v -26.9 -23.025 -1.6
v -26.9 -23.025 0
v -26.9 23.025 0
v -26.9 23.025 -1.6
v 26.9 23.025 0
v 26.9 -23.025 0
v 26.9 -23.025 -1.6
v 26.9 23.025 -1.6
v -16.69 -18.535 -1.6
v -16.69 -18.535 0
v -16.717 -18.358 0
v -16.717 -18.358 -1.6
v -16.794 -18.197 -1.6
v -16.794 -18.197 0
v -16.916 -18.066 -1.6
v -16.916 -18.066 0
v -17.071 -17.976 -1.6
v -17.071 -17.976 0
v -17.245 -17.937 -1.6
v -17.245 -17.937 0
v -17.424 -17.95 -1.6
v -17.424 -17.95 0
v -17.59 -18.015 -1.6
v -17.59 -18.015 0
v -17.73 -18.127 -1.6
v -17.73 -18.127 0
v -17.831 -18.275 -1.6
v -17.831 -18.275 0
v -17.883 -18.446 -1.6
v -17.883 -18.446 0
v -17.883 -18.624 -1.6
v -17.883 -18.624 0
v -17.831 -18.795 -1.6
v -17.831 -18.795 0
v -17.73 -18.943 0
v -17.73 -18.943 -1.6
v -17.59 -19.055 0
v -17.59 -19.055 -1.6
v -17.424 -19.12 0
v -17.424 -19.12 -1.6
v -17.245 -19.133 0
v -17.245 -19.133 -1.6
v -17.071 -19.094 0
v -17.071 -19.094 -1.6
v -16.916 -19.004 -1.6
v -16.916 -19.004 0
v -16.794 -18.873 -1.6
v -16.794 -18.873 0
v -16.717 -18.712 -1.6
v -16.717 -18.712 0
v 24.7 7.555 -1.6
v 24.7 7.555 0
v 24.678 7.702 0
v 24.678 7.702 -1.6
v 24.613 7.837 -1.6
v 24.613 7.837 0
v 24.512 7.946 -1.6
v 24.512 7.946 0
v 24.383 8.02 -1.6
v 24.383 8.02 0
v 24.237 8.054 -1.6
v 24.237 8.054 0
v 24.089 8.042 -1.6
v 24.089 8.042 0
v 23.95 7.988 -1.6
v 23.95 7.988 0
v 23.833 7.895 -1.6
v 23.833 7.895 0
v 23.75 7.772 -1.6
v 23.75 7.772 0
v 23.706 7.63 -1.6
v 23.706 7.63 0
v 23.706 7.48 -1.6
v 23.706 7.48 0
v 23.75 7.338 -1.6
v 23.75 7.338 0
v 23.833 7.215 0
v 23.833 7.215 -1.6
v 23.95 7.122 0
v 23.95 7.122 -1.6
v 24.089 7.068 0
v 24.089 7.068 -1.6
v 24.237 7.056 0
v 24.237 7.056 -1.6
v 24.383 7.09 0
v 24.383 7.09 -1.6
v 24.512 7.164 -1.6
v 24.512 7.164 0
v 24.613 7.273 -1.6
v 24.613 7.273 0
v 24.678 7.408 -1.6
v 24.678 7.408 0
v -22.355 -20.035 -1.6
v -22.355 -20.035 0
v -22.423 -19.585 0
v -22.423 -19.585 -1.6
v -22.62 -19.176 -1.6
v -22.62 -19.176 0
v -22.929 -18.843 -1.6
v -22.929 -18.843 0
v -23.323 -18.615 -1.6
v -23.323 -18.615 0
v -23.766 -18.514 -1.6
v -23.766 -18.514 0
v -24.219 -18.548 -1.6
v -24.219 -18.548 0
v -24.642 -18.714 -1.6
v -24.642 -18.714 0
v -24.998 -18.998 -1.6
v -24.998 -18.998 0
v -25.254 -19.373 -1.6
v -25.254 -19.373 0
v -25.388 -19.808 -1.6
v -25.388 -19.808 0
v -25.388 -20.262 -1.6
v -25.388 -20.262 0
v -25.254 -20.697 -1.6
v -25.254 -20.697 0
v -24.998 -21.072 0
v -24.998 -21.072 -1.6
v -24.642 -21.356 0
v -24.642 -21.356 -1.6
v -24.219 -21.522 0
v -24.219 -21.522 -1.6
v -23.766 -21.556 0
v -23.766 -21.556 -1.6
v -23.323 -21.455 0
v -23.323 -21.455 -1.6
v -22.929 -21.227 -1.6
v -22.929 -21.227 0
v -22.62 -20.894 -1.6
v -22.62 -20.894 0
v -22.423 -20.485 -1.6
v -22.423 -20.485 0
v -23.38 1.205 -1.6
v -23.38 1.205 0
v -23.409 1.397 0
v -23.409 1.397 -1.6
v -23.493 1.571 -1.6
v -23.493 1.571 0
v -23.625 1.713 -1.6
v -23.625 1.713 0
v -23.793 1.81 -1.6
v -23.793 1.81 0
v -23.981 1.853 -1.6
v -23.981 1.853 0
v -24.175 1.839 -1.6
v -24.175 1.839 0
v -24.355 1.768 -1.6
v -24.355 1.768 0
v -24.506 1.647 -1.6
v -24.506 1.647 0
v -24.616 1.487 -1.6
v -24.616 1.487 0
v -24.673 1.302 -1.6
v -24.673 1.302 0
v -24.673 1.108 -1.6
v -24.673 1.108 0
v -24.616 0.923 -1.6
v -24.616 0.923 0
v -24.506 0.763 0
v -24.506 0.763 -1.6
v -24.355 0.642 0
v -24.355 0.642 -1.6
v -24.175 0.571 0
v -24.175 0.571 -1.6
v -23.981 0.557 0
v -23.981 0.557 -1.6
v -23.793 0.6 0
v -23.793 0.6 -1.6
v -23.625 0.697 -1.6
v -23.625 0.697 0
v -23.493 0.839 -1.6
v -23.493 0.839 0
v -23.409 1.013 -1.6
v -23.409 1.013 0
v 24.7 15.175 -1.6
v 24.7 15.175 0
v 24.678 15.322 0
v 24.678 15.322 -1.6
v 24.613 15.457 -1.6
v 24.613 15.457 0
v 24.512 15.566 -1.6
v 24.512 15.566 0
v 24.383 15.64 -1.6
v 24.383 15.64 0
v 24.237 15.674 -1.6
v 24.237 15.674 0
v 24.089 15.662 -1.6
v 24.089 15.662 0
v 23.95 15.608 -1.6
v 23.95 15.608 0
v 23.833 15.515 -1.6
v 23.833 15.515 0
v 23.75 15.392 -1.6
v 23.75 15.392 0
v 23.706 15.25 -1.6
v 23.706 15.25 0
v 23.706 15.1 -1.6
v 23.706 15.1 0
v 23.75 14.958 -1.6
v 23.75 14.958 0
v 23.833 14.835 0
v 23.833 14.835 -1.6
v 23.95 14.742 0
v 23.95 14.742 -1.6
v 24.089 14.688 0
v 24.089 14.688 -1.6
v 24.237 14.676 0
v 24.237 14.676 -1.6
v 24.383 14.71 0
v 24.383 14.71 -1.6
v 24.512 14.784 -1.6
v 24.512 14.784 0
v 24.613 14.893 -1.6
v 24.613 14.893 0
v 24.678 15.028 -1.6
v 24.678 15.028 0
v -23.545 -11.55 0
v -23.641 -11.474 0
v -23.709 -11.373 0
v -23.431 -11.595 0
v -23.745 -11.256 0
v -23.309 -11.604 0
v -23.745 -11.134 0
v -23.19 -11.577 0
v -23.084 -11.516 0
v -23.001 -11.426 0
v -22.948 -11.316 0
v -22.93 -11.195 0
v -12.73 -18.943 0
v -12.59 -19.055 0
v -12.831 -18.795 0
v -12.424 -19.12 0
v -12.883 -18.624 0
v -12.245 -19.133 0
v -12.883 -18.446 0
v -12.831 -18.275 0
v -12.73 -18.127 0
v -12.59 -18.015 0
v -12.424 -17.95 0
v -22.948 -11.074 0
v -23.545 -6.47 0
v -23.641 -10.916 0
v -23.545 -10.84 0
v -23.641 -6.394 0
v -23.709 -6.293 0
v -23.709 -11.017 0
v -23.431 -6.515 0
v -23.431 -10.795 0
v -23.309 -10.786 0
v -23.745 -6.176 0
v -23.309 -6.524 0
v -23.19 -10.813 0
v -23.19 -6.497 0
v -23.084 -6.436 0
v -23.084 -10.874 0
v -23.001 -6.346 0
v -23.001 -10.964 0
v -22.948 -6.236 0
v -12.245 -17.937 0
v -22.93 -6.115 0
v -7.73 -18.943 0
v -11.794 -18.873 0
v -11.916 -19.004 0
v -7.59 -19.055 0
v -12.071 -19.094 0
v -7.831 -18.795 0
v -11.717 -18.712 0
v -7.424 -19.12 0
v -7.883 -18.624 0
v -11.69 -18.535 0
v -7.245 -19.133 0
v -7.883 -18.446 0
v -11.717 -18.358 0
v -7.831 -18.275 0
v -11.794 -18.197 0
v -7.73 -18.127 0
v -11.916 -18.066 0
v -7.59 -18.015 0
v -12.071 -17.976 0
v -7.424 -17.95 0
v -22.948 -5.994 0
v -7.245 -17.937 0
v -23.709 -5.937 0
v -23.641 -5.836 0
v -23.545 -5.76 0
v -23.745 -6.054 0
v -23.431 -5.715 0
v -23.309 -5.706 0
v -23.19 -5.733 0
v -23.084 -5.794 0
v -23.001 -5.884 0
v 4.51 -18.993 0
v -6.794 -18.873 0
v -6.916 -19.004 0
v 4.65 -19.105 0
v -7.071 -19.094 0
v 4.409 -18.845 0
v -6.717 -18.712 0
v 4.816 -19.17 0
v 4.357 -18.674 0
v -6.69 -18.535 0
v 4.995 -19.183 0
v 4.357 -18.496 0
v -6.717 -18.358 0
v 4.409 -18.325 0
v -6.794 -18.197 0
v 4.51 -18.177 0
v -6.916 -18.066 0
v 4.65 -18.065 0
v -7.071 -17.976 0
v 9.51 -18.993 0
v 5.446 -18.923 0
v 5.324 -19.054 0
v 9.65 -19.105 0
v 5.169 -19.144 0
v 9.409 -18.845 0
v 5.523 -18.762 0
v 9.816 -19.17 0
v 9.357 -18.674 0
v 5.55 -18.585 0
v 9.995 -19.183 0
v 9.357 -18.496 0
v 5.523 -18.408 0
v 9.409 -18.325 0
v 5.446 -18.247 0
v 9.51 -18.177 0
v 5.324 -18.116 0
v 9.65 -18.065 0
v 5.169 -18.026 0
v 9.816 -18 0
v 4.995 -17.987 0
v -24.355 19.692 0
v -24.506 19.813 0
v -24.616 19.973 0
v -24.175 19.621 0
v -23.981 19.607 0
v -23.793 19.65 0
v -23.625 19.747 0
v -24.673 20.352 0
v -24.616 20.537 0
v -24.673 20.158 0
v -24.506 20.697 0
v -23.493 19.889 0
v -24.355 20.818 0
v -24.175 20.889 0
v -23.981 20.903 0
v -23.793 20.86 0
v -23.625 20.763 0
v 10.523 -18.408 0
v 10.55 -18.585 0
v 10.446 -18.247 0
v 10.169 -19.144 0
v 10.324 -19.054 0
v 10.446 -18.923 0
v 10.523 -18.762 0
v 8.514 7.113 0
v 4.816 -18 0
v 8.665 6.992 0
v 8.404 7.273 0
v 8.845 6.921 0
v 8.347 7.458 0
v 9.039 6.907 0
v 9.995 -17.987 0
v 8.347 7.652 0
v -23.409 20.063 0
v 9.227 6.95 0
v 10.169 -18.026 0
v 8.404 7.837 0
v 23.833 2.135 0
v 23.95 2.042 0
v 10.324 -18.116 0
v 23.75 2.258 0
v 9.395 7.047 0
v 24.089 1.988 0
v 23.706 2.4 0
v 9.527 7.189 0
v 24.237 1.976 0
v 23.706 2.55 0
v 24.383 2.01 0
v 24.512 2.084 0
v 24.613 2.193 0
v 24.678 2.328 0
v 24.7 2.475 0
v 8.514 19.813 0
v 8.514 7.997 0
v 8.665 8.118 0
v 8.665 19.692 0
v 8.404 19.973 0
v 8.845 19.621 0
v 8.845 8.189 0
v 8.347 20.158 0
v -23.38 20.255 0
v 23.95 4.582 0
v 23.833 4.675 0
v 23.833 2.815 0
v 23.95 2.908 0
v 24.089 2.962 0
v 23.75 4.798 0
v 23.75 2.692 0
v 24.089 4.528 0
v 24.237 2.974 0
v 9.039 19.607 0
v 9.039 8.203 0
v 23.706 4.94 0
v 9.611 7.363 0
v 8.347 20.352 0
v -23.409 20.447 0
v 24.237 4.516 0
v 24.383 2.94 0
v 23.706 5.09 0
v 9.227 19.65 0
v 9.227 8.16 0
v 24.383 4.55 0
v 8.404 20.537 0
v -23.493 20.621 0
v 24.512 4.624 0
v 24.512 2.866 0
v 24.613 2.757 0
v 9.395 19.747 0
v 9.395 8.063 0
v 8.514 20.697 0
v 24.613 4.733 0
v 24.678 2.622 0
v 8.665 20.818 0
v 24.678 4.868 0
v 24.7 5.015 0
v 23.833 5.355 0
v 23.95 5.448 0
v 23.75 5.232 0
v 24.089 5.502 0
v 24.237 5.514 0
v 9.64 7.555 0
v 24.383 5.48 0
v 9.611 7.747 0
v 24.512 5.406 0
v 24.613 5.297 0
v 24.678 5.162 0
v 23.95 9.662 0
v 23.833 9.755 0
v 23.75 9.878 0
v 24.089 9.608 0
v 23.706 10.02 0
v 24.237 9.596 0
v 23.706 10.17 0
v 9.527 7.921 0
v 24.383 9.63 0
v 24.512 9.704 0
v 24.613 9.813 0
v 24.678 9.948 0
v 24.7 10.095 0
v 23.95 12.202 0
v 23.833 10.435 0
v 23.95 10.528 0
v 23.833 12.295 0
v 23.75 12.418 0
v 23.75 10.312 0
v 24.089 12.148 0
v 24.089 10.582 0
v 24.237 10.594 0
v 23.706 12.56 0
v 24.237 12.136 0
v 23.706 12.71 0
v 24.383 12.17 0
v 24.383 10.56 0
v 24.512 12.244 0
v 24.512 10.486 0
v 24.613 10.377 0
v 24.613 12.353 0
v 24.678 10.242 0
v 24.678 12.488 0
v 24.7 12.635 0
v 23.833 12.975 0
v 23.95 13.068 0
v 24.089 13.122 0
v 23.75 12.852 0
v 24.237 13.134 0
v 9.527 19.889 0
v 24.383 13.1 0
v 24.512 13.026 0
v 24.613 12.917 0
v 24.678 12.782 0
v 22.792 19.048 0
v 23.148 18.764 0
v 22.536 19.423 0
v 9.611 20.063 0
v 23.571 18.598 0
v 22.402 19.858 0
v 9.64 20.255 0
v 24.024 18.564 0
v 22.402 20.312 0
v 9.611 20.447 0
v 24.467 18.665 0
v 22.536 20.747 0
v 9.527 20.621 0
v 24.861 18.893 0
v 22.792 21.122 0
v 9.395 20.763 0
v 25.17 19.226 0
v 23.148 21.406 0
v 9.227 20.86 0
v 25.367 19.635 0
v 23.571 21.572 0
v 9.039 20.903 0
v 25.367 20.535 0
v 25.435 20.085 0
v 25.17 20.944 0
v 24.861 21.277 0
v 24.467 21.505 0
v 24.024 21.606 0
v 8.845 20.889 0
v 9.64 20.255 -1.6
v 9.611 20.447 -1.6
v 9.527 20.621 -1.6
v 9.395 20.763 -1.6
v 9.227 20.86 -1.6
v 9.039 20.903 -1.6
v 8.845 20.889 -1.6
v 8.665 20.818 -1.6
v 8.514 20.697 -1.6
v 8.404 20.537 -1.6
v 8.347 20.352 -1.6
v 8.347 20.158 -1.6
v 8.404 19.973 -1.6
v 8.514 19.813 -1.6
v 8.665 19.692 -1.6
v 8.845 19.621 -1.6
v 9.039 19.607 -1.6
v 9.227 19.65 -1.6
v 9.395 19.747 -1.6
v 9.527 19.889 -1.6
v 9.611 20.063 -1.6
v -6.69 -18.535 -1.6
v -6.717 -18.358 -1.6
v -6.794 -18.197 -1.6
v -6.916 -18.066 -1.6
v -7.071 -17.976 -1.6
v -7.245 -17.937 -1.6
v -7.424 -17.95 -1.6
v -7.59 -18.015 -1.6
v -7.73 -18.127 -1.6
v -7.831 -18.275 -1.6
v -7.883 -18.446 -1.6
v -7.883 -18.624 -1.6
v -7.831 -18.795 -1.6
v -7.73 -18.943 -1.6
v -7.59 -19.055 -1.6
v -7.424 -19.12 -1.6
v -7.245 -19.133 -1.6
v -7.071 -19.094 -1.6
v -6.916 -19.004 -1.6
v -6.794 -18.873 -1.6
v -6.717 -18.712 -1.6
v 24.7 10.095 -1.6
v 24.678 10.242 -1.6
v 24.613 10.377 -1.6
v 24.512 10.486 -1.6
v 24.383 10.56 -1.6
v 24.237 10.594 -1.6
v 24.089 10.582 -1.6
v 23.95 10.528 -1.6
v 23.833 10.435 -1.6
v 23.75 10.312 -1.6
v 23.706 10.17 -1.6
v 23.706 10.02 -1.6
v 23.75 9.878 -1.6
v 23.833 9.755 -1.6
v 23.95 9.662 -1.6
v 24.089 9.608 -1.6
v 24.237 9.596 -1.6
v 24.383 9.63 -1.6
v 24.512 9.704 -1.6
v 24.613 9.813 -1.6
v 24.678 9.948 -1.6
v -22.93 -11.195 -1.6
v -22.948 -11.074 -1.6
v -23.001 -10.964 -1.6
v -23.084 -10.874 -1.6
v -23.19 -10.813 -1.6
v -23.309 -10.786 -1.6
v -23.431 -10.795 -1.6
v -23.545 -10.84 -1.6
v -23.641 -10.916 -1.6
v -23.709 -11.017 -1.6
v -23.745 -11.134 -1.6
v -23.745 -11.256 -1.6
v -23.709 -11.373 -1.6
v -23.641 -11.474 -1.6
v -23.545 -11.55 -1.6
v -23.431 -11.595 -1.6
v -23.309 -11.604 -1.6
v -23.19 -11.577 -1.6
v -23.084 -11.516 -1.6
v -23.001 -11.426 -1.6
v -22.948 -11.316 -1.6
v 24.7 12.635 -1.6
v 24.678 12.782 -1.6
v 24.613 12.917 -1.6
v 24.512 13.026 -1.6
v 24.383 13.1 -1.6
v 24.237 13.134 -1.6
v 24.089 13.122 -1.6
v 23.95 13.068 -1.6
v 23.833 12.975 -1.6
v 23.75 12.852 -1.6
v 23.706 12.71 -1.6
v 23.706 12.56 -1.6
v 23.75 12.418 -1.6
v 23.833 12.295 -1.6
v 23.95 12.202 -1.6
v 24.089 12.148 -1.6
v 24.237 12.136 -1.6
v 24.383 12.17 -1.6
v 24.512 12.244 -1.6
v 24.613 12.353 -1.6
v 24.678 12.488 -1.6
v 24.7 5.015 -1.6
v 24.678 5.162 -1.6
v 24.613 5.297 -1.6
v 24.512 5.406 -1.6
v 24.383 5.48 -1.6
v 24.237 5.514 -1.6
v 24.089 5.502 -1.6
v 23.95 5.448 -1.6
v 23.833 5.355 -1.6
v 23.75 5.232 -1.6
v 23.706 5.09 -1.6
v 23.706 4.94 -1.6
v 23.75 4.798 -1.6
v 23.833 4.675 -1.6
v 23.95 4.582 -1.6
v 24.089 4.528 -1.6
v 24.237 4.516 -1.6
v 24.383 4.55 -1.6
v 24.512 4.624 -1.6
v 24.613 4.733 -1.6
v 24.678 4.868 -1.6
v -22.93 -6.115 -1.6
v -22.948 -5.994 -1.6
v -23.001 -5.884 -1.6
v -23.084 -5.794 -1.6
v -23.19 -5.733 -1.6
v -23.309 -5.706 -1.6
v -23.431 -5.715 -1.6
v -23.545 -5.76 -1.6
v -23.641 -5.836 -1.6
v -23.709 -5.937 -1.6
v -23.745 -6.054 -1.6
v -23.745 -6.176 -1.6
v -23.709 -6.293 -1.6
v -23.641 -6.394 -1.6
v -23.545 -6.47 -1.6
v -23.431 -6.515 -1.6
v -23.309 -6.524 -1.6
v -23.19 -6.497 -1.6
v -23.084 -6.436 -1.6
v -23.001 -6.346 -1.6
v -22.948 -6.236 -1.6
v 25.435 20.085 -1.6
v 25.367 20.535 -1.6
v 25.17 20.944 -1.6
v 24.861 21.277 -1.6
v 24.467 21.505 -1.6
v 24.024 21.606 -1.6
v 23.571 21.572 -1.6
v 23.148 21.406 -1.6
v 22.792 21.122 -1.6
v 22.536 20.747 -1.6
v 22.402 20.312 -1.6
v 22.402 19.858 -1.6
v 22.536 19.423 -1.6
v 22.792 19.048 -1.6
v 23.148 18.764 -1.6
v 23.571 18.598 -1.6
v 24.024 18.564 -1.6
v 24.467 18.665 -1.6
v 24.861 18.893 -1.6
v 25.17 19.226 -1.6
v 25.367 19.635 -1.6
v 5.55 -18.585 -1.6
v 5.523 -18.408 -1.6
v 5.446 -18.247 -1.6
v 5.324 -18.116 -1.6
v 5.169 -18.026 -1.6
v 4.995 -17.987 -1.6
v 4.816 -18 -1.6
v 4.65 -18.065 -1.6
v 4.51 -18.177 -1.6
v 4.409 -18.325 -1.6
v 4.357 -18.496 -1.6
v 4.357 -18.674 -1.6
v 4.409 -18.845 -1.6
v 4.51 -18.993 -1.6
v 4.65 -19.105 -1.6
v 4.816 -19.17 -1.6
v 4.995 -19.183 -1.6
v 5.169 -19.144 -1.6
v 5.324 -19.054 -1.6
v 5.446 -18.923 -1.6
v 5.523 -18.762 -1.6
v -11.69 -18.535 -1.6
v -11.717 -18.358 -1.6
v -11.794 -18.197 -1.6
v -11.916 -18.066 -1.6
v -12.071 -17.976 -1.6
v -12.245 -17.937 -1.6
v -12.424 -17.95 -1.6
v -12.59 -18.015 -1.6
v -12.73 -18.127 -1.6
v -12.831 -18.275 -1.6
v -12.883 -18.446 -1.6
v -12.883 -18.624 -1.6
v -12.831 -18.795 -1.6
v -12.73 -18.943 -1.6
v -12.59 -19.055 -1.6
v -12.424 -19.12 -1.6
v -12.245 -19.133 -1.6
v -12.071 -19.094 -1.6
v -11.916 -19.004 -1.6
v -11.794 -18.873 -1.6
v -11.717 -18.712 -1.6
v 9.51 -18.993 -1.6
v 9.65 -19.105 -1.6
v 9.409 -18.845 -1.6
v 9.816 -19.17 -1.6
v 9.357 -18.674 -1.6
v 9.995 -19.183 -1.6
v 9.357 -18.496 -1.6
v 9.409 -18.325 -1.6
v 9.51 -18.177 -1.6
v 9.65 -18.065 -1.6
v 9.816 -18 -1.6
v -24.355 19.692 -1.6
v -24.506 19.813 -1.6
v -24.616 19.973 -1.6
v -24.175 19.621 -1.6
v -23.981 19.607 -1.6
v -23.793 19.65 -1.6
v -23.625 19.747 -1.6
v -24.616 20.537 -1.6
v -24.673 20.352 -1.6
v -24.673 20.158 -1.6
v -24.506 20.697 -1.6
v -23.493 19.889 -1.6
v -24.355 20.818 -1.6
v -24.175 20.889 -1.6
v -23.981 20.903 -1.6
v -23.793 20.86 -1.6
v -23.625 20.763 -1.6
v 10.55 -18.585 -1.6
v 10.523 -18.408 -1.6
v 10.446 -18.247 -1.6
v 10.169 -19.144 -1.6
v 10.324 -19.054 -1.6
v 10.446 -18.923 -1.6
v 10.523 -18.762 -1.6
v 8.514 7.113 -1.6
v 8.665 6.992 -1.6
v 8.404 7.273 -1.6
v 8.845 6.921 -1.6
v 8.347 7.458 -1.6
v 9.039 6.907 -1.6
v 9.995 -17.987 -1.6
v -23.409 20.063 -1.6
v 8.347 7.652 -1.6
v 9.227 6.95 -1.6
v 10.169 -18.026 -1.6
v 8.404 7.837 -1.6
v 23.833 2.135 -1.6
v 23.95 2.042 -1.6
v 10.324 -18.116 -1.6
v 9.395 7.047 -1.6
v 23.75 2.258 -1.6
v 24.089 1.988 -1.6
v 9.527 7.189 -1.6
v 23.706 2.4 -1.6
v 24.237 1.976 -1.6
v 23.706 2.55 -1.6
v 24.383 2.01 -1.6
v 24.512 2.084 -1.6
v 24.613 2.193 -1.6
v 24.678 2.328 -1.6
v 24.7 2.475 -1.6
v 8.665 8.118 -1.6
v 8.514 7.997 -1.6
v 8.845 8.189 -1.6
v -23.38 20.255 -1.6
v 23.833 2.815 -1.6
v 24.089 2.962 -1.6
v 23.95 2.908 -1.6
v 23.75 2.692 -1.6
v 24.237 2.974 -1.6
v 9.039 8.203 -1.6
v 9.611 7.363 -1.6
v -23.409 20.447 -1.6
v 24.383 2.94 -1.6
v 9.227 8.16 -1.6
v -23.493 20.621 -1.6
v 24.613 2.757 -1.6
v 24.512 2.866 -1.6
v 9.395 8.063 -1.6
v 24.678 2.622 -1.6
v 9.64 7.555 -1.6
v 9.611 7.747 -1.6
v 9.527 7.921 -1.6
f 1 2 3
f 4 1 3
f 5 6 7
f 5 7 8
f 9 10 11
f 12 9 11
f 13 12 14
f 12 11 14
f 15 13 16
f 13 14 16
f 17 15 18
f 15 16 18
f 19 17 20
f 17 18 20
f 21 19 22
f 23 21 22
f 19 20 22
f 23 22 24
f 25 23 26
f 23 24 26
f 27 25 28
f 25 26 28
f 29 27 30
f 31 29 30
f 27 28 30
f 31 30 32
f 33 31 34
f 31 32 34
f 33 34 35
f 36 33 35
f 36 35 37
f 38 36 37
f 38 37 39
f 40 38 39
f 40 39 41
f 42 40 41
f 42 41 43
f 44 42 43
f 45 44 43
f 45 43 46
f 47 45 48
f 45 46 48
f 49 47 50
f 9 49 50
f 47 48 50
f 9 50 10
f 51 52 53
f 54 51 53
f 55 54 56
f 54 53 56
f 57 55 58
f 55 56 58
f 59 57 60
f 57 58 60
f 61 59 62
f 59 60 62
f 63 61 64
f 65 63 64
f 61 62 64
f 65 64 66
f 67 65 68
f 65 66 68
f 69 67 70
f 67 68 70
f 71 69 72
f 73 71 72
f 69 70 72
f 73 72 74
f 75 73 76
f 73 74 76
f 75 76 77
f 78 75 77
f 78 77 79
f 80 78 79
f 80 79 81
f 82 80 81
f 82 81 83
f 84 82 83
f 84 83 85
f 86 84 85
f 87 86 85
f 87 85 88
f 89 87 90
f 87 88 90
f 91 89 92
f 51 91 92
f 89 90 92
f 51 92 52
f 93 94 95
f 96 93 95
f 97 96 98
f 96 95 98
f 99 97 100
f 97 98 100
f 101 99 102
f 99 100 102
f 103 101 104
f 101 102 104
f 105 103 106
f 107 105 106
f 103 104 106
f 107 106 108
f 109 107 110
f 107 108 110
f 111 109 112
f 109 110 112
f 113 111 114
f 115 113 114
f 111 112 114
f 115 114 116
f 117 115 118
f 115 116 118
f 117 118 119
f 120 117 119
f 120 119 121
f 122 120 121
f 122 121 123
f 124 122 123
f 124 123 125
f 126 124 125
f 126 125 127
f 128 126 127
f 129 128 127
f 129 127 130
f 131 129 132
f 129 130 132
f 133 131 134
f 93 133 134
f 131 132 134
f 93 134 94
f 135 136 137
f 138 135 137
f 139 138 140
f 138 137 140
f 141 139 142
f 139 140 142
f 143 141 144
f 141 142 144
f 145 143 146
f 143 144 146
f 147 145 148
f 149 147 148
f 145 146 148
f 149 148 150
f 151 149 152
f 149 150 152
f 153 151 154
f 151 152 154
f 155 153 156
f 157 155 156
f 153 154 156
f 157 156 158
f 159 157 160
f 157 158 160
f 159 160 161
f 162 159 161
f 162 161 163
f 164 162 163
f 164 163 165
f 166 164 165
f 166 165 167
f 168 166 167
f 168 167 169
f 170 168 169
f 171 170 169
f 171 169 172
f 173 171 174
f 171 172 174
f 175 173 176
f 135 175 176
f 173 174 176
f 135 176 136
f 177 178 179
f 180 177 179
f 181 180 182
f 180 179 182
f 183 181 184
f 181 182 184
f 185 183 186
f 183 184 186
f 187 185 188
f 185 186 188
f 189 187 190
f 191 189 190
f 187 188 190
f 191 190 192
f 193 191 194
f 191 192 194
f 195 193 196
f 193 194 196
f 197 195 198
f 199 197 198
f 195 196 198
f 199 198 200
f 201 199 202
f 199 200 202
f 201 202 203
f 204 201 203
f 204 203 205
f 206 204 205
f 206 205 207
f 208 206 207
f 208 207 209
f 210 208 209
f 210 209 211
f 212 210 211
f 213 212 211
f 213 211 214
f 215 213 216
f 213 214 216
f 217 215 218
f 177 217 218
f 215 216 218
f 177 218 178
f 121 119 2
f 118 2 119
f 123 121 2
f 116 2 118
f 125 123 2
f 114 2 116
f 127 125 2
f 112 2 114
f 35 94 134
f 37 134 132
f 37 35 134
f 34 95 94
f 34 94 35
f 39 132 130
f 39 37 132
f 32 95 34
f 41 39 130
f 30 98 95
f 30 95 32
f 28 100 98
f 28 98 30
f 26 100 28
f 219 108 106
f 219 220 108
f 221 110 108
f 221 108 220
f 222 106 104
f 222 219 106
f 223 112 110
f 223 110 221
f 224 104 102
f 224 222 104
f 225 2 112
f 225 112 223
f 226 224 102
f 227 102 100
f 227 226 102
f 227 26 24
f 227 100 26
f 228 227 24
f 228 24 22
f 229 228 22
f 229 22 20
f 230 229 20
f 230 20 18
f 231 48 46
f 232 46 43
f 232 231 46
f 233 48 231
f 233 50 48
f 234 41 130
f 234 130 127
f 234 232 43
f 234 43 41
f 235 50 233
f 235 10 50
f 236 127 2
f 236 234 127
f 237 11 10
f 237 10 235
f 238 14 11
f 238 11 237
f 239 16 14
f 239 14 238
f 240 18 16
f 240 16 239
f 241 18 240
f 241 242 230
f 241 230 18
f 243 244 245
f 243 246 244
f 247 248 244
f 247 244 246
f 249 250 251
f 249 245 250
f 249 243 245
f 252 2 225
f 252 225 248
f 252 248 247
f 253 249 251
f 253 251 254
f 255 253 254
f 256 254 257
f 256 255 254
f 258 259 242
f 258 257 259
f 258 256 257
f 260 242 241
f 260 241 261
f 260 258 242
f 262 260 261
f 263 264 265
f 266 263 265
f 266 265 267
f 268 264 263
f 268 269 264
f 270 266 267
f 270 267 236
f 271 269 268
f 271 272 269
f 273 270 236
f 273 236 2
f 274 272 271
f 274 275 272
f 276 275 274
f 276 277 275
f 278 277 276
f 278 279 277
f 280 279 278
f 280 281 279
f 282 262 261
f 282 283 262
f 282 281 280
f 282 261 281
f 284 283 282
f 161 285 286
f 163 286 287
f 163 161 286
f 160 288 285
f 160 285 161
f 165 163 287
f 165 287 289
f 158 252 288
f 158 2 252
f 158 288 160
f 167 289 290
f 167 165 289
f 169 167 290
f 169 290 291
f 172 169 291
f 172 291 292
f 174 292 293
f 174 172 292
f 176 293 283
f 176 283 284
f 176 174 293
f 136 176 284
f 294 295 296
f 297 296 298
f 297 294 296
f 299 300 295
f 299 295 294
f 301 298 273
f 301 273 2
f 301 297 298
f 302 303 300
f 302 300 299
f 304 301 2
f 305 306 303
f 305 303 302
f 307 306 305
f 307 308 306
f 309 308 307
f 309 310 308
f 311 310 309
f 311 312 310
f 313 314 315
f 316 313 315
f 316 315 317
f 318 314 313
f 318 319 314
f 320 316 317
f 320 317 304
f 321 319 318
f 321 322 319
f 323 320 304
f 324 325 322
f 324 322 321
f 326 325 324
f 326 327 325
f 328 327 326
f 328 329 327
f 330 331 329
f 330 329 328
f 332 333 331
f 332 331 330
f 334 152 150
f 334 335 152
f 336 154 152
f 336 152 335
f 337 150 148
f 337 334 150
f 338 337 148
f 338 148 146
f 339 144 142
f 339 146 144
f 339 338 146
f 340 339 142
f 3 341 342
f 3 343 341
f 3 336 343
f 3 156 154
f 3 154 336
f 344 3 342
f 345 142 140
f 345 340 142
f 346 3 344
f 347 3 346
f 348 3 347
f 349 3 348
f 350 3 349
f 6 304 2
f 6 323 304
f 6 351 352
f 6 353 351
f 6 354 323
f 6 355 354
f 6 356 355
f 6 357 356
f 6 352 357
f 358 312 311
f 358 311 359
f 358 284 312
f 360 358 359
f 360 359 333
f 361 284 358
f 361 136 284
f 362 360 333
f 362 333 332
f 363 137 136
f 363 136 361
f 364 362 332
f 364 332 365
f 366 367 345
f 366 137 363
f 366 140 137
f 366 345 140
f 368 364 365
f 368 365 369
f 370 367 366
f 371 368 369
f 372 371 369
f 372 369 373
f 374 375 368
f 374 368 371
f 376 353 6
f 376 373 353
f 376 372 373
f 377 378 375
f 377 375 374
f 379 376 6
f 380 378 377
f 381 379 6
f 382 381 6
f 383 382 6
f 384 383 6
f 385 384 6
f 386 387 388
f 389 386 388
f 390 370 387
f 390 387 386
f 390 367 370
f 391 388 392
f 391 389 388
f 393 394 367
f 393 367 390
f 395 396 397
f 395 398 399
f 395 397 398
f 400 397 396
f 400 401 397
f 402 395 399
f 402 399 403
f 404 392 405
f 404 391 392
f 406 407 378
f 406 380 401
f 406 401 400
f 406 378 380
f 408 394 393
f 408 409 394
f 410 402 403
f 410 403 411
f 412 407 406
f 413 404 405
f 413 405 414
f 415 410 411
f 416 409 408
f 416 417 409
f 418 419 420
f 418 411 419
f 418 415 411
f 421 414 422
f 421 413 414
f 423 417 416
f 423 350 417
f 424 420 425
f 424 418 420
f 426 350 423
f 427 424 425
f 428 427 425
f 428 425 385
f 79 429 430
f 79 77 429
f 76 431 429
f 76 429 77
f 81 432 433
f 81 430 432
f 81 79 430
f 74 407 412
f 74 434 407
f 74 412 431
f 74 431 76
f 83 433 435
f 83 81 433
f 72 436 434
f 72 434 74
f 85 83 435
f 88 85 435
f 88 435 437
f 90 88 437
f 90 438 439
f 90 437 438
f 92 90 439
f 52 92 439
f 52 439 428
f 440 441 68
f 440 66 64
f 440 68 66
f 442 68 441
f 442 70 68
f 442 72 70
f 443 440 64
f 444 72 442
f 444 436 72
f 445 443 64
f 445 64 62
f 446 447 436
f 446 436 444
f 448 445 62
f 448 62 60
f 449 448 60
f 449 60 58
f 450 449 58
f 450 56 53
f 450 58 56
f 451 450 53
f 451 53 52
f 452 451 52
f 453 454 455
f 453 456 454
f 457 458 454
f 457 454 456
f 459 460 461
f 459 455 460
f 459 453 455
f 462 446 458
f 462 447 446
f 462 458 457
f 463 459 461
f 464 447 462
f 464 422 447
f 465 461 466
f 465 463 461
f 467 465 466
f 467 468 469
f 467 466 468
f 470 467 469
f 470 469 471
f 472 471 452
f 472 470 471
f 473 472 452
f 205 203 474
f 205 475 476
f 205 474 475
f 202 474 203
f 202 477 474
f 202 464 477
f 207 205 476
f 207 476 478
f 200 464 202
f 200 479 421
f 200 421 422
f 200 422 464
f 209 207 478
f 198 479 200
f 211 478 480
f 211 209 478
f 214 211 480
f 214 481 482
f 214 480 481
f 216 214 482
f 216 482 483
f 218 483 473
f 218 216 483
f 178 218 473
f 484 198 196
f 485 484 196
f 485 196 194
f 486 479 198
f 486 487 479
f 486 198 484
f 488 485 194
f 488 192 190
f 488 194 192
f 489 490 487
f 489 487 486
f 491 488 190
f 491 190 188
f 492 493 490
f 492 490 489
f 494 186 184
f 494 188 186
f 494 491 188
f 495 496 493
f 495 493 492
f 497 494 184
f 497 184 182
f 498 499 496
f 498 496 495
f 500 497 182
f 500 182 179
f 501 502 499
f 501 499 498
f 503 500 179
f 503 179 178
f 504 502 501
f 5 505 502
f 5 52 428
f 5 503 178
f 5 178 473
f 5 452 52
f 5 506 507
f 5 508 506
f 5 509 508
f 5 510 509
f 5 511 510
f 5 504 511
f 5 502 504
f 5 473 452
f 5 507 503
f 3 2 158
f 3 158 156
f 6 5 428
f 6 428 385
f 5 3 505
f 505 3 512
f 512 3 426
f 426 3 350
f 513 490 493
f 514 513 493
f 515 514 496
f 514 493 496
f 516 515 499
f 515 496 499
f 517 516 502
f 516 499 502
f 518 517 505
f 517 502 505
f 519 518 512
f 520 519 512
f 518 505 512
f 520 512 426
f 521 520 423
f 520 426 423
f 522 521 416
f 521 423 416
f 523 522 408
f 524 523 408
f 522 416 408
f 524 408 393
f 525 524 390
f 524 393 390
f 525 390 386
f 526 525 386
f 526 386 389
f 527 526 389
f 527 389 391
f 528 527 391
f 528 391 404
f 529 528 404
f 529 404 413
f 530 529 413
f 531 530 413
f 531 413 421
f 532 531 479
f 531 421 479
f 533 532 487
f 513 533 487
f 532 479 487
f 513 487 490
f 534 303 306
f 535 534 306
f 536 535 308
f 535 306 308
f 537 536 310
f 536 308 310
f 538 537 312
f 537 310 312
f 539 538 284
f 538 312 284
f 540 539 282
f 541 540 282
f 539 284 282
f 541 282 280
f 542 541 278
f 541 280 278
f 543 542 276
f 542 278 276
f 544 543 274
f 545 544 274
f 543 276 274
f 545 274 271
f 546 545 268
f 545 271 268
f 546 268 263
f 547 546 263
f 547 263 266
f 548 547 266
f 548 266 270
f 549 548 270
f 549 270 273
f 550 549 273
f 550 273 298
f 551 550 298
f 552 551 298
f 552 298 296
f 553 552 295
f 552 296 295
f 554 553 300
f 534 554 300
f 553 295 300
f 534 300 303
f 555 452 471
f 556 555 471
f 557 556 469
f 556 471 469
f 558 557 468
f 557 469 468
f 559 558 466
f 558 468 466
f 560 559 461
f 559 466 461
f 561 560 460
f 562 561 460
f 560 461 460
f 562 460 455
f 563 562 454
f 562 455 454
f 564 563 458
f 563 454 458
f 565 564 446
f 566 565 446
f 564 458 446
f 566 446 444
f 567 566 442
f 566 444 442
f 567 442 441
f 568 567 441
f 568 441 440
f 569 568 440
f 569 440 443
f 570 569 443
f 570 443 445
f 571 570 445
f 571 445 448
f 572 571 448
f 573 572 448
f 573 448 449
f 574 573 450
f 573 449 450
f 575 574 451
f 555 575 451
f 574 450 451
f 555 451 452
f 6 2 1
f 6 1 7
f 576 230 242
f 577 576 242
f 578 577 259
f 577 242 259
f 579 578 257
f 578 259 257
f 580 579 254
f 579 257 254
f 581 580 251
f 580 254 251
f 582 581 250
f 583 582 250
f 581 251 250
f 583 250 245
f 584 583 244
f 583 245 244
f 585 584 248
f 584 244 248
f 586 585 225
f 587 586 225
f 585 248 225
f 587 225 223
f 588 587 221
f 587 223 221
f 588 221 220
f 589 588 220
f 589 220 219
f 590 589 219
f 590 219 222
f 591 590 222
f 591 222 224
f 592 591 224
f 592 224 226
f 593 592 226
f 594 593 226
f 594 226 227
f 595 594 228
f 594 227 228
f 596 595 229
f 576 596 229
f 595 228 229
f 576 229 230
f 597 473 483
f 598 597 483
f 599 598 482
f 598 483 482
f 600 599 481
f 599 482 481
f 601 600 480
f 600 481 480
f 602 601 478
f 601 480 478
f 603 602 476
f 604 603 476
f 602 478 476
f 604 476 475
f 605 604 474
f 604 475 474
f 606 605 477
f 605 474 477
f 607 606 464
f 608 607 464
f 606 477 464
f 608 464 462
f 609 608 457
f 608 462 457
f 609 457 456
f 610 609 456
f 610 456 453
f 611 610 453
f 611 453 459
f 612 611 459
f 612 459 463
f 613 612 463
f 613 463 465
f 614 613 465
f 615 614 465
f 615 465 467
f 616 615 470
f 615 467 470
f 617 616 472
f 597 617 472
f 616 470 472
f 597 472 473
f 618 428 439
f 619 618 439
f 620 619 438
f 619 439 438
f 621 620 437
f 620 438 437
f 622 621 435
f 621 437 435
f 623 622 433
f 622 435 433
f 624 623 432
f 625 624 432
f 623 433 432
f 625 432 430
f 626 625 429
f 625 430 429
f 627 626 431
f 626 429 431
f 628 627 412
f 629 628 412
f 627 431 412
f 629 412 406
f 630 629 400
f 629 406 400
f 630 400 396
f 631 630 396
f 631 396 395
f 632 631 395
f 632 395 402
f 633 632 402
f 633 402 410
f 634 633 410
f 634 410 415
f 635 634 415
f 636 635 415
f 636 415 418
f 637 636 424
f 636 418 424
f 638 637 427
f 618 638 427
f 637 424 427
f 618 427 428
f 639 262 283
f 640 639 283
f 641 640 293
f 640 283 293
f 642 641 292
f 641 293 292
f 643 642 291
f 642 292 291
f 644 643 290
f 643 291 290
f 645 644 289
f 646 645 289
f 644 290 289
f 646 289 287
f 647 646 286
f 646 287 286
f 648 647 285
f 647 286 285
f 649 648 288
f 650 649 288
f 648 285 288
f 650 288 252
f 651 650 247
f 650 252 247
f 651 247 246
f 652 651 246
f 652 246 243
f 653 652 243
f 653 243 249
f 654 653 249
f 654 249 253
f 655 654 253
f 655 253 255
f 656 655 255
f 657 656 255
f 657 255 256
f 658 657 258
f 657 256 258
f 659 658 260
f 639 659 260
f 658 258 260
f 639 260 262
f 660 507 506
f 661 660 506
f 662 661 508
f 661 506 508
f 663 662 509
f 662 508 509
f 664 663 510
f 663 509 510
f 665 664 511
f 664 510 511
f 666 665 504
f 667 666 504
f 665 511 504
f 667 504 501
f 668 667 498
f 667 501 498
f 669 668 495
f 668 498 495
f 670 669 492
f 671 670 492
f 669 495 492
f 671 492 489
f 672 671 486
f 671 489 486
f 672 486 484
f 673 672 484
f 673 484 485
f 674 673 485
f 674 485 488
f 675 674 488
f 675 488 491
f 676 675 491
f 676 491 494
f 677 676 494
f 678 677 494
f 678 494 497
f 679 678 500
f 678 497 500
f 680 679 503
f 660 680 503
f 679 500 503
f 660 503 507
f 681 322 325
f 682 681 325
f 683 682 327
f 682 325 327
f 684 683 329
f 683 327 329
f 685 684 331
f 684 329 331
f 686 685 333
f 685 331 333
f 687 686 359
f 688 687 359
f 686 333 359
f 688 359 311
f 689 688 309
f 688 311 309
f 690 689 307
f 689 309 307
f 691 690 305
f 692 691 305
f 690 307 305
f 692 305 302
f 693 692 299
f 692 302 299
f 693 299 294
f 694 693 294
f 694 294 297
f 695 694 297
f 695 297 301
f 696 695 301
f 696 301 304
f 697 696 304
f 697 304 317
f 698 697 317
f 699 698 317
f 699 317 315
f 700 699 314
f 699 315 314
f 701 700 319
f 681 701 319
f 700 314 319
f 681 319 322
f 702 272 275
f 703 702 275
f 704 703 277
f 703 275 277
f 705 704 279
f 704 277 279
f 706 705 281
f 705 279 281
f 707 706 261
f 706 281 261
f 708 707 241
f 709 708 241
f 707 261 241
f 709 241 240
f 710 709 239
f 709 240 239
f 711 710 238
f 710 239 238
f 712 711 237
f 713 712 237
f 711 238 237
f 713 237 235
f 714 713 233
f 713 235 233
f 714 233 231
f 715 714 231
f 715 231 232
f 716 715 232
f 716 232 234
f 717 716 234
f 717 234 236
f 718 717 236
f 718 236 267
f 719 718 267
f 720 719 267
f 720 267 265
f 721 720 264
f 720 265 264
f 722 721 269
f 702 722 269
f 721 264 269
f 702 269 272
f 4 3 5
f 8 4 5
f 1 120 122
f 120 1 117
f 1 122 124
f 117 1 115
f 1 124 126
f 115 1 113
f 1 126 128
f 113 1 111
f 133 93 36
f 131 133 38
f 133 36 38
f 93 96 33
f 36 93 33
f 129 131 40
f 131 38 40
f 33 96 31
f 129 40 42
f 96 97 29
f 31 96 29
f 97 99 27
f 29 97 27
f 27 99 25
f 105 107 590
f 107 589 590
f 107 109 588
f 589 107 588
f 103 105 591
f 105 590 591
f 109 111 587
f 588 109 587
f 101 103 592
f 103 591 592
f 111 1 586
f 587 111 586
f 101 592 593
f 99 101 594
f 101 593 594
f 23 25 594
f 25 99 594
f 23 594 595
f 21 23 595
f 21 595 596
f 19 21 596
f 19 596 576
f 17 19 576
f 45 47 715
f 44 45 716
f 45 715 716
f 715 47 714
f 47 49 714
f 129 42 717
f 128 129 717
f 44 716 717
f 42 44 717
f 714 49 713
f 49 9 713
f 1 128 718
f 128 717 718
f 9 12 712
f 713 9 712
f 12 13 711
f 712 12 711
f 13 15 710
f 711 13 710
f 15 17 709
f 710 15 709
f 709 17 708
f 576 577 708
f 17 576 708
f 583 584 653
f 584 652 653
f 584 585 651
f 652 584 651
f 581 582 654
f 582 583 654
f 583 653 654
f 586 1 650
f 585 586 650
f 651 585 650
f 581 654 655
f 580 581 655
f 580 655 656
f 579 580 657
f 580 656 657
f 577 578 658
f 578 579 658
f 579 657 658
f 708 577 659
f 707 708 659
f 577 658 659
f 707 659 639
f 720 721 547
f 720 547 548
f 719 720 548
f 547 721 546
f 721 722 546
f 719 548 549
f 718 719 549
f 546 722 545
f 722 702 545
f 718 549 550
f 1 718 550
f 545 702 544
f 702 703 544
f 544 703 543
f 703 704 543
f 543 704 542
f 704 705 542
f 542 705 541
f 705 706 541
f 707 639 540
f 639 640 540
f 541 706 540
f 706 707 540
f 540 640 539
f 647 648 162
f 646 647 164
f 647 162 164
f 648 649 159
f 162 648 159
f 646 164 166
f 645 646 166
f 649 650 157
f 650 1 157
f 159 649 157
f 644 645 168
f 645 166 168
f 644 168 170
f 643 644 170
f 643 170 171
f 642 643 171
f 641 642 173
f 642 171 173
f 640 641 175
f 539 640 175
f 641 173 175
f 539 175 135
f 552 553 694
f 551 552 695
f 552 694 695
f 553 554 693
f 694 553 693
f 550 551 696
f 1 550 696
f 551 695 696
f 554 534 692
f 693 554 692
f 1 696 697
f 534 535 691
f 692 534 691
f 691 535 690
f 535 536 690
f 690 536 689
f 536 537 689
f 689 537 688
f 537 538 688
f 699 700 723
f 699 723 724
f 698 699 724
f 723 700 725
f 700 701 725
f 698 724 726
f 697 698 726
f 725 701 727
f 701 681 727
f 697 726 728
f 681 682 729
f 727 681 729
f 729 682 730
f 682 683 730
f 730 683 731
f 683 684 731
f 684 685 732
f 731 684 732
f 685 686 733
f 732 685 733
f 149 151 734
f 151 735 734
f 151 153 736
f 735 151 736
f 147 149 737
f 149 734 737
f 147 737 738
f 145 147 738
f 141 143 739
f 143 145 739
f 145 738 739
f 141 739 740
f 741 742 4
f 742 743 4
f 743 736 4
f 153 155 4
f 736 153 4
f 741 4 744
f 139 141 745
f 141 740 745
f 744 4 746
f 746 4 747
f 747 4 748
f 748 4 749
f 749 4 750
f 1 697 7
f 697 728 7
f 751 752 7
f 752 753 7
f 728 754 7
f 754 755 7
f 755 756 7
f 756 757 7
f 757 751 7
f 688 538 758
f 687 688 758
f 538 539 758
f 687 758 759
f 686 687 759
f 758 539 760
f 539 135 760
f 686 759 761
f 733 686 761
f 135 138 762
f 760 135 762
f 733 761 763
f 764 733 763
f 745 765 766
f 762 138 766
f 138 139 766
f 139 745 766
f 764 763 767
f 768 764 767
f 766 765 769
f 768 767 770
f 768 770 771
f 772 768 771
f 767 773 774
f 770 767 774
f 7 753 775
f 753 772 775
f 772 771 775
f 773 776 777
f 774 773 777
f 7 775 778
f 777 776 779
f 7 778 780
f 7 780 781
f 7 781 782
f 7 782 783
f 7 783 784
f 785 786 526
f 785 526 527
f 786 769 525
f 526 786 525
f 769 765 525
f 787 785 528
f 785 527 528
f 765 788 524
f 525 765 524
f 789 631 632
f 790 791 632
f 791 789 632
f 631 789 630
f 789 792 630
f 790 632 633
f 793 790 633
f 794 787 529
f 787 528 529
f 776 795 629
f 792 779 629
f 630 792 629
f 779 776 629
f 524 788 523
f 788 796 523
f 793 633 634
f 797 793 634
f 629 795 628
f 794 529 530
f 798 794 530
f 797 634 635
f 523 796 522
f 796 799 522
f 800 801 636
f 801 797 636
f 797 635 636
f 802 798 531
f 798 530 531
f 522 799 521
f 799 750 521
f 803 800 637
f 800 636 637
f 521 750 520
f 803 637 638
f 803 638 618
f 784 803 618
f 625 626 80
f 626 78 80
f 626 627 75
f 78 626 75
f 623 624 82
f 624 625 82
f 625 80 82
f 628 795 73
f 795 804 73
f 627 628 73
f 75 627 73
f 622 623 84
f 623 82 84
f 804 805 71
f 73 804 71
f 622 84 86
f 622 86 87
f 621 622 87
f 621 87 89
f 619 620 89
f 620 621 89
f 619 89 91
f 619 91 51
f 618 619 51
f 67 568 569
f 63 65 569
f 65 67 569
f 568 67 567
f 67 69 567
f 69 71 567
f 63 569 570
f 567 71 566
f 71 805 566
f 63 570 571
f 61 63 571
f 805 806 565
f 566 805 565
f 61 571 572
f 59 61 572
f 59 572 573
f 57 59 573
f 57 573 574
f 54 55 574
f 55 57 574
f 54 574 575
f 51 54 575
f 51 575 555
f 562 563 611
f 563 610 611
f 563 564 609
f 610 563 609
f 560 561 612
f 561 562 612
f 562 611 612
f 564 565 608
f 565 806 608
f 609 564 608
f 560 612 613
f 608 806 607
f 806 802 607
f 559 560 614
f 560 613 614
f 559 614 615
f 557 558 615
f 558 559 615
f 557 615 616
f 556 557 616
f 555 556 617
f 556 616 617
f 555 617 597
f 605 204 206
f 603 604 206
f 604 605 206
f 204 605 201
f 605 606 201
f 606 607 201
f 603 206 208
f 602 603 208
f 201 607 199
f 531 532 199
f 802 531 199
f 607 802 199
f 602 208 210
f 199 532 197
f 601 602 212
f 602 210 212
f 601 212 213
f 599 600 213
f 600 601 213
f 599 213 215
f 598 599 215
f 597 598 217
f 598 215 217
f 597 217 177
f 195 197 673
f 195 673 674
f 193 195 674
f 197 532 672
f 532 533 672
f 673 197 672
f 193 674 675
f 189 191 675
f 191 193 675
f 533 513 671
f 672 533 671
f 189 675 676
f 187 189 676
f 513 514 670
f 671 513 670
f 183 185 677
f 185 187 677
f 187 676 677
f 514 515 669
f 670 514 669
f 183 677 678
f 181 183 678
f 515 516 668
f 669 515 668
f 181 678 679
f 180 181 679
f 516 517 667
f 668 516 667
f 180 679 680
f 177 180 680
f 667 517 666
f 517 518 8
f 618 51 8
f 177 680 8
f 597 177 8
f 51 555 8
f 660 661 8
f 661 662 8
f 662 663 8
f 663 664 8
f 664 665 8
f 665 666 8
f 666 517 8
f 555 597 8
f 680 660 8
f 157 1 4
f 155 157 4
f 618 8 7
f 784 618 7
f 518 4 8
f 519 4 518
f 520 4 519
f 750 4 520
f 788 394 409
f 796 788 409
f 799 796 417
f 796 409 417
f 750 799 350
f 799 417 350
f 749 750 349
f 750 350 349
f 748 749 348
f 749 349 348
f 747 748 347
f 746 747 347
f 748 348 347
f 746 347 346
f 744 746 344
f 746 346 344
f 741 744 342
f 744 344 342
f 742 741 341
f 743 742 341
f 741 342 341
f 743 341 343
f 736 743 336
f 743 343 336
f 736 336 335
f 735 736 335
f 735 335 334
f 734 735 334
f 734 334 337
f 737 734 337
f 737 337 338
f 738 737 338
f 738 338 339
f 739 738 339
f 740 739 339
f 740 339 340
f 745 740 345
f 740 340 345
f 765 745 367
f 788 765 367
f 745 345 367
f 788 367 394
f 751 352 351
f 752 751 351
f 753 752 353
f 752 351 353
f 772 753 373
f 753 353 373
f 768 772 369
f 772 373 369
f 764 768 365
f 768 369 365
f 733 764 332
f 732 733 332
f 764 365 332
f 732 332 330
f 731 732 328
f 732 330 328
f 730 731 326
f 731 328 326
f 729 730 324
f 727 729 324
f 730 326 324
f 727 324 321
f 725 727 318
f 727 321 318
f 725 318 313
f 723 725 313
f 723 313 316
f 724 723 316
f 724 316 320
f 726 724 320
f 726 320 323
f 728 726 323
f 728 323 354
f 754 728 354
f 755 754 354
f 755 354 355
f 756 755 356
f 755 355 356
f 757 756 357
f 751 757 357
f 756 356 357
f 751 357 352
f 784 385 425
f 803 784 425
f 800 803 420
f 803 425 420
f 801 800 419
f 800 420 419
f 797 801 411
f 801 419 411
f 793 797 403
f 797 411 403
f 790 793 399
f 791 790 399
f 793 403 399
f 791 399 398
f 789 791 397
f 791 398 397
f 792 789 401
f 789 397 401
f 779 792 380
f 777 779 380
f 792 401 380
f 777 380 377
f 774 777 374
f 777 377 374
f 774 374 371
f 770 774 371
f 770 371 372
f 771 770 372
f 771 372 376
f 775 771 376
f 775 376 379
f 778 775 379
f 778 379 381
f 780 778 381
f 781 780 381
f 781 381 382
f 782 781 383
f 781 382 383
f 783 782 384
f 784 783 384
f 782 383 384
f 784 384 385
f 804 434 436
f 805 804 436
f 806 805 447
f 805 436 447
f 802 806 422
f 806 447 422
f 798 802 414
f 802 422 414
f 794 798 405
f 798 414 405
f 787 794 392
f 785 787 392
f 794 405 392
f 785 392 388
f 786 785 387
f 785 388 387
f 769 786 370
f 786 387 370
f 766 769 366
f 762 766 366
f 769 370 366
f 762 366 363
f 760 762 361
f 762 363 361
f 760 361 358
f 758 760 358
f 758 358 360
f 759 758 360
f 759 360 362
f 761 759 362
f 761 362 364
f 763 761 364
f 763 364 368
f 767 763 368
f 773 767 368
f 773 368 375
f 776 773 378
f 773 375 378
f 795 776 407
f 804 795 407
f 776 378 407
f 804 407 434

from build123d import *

# Parameters (mm, degrees)
F0_W     = 53.8
F0_H     = 46.05
F0_R     = 1.525
F0_R_2   = 0.6
F0_R_3   = 0.41
F0_R_4   = 0.65
F0_R_5   = 0.5
F1_DEPTH = 1.6


with BuildPart() as f1:
    # F0 (on Top) → F1 (new body)
    with BuildSketch(Plane.XY):
        Rectangle(F0_W, F0_H)
        with Locations((-23.88, -20.035)):
            Circle(F0_R, mode=Mode.SUBTRACT)
        with Locations((-17.29, -18.535)):
            Circle(F0_R_2, mode=Mode.SUBTRACT)
        with Locations((-12.29, -18.535)):
            Circle(F0_R_2, mode=Mode.SUBTRACT)
        with Locations((-7.29, -18.535)):
            Circle(F0_R_2, mode=Mode.SUBTRACT)
        with Locations((-23.34, -11.195)):
            Circle(F0_R_3, mode=Mode.SUBTRACT)
        with Locations((-23.34, -6.115)):
            Circle(F0_R_3, mode=Mode.SUBTRACT)
        with Locations((4.95, -18.585)):
            Circle(F0_R_2, mode=Mode.SUBTRACT)
        with Locations((9.95, -18.585)):
            Circle(F0_R_2, mode=Mode.SUBTRACT)
        with Locations((-24.03, 1.205)):
            Circle(F0_R_4, mode=Mode.SUBTRACT)
        with Locations((-24.03, 20.255)):
            Circle(F0_R_4, mode=Mode.SUBTRACT)
        with Locations((8.99, 7.555)):
            Circle(F0_R_4, mode=Mode.SUBTRACT)
        with Locations((24.2, 2.475)):
            Circle(F0_R_5, mode=Mode.SUBTRACT)
        with Locations((24.2, 5.015)):
            Circle(F0_R_5, mode=Mode.SUBTRACT)
        with Locations((24.2, 7.555)):
            Circle(F0_R_5, mode=Mode.SUBTRACT)
        with Locations((24.2, 10.095)):
            Circle(F0_R_5, mode=Mode.SUBTRACT)
        with Locations((8.99, 20.255)):
            Circle(F0_R_4, mode=Mode.SUBTRACT)
        with Locations((24.2, 12.635)):
            Circle(F0_R_5, mode=Mode.SUBTRACT)
        with Locations((24.2, 15.175)):
            Circle(F0_R_5, mode=Mode.SUBTRACT)
        with Locations((23.91, 20.085)):
            Circle(F0_R, mode=Mode.SUBTRACT)
    extrude(amount=-F1_DEPTH)


solid = f1.part
